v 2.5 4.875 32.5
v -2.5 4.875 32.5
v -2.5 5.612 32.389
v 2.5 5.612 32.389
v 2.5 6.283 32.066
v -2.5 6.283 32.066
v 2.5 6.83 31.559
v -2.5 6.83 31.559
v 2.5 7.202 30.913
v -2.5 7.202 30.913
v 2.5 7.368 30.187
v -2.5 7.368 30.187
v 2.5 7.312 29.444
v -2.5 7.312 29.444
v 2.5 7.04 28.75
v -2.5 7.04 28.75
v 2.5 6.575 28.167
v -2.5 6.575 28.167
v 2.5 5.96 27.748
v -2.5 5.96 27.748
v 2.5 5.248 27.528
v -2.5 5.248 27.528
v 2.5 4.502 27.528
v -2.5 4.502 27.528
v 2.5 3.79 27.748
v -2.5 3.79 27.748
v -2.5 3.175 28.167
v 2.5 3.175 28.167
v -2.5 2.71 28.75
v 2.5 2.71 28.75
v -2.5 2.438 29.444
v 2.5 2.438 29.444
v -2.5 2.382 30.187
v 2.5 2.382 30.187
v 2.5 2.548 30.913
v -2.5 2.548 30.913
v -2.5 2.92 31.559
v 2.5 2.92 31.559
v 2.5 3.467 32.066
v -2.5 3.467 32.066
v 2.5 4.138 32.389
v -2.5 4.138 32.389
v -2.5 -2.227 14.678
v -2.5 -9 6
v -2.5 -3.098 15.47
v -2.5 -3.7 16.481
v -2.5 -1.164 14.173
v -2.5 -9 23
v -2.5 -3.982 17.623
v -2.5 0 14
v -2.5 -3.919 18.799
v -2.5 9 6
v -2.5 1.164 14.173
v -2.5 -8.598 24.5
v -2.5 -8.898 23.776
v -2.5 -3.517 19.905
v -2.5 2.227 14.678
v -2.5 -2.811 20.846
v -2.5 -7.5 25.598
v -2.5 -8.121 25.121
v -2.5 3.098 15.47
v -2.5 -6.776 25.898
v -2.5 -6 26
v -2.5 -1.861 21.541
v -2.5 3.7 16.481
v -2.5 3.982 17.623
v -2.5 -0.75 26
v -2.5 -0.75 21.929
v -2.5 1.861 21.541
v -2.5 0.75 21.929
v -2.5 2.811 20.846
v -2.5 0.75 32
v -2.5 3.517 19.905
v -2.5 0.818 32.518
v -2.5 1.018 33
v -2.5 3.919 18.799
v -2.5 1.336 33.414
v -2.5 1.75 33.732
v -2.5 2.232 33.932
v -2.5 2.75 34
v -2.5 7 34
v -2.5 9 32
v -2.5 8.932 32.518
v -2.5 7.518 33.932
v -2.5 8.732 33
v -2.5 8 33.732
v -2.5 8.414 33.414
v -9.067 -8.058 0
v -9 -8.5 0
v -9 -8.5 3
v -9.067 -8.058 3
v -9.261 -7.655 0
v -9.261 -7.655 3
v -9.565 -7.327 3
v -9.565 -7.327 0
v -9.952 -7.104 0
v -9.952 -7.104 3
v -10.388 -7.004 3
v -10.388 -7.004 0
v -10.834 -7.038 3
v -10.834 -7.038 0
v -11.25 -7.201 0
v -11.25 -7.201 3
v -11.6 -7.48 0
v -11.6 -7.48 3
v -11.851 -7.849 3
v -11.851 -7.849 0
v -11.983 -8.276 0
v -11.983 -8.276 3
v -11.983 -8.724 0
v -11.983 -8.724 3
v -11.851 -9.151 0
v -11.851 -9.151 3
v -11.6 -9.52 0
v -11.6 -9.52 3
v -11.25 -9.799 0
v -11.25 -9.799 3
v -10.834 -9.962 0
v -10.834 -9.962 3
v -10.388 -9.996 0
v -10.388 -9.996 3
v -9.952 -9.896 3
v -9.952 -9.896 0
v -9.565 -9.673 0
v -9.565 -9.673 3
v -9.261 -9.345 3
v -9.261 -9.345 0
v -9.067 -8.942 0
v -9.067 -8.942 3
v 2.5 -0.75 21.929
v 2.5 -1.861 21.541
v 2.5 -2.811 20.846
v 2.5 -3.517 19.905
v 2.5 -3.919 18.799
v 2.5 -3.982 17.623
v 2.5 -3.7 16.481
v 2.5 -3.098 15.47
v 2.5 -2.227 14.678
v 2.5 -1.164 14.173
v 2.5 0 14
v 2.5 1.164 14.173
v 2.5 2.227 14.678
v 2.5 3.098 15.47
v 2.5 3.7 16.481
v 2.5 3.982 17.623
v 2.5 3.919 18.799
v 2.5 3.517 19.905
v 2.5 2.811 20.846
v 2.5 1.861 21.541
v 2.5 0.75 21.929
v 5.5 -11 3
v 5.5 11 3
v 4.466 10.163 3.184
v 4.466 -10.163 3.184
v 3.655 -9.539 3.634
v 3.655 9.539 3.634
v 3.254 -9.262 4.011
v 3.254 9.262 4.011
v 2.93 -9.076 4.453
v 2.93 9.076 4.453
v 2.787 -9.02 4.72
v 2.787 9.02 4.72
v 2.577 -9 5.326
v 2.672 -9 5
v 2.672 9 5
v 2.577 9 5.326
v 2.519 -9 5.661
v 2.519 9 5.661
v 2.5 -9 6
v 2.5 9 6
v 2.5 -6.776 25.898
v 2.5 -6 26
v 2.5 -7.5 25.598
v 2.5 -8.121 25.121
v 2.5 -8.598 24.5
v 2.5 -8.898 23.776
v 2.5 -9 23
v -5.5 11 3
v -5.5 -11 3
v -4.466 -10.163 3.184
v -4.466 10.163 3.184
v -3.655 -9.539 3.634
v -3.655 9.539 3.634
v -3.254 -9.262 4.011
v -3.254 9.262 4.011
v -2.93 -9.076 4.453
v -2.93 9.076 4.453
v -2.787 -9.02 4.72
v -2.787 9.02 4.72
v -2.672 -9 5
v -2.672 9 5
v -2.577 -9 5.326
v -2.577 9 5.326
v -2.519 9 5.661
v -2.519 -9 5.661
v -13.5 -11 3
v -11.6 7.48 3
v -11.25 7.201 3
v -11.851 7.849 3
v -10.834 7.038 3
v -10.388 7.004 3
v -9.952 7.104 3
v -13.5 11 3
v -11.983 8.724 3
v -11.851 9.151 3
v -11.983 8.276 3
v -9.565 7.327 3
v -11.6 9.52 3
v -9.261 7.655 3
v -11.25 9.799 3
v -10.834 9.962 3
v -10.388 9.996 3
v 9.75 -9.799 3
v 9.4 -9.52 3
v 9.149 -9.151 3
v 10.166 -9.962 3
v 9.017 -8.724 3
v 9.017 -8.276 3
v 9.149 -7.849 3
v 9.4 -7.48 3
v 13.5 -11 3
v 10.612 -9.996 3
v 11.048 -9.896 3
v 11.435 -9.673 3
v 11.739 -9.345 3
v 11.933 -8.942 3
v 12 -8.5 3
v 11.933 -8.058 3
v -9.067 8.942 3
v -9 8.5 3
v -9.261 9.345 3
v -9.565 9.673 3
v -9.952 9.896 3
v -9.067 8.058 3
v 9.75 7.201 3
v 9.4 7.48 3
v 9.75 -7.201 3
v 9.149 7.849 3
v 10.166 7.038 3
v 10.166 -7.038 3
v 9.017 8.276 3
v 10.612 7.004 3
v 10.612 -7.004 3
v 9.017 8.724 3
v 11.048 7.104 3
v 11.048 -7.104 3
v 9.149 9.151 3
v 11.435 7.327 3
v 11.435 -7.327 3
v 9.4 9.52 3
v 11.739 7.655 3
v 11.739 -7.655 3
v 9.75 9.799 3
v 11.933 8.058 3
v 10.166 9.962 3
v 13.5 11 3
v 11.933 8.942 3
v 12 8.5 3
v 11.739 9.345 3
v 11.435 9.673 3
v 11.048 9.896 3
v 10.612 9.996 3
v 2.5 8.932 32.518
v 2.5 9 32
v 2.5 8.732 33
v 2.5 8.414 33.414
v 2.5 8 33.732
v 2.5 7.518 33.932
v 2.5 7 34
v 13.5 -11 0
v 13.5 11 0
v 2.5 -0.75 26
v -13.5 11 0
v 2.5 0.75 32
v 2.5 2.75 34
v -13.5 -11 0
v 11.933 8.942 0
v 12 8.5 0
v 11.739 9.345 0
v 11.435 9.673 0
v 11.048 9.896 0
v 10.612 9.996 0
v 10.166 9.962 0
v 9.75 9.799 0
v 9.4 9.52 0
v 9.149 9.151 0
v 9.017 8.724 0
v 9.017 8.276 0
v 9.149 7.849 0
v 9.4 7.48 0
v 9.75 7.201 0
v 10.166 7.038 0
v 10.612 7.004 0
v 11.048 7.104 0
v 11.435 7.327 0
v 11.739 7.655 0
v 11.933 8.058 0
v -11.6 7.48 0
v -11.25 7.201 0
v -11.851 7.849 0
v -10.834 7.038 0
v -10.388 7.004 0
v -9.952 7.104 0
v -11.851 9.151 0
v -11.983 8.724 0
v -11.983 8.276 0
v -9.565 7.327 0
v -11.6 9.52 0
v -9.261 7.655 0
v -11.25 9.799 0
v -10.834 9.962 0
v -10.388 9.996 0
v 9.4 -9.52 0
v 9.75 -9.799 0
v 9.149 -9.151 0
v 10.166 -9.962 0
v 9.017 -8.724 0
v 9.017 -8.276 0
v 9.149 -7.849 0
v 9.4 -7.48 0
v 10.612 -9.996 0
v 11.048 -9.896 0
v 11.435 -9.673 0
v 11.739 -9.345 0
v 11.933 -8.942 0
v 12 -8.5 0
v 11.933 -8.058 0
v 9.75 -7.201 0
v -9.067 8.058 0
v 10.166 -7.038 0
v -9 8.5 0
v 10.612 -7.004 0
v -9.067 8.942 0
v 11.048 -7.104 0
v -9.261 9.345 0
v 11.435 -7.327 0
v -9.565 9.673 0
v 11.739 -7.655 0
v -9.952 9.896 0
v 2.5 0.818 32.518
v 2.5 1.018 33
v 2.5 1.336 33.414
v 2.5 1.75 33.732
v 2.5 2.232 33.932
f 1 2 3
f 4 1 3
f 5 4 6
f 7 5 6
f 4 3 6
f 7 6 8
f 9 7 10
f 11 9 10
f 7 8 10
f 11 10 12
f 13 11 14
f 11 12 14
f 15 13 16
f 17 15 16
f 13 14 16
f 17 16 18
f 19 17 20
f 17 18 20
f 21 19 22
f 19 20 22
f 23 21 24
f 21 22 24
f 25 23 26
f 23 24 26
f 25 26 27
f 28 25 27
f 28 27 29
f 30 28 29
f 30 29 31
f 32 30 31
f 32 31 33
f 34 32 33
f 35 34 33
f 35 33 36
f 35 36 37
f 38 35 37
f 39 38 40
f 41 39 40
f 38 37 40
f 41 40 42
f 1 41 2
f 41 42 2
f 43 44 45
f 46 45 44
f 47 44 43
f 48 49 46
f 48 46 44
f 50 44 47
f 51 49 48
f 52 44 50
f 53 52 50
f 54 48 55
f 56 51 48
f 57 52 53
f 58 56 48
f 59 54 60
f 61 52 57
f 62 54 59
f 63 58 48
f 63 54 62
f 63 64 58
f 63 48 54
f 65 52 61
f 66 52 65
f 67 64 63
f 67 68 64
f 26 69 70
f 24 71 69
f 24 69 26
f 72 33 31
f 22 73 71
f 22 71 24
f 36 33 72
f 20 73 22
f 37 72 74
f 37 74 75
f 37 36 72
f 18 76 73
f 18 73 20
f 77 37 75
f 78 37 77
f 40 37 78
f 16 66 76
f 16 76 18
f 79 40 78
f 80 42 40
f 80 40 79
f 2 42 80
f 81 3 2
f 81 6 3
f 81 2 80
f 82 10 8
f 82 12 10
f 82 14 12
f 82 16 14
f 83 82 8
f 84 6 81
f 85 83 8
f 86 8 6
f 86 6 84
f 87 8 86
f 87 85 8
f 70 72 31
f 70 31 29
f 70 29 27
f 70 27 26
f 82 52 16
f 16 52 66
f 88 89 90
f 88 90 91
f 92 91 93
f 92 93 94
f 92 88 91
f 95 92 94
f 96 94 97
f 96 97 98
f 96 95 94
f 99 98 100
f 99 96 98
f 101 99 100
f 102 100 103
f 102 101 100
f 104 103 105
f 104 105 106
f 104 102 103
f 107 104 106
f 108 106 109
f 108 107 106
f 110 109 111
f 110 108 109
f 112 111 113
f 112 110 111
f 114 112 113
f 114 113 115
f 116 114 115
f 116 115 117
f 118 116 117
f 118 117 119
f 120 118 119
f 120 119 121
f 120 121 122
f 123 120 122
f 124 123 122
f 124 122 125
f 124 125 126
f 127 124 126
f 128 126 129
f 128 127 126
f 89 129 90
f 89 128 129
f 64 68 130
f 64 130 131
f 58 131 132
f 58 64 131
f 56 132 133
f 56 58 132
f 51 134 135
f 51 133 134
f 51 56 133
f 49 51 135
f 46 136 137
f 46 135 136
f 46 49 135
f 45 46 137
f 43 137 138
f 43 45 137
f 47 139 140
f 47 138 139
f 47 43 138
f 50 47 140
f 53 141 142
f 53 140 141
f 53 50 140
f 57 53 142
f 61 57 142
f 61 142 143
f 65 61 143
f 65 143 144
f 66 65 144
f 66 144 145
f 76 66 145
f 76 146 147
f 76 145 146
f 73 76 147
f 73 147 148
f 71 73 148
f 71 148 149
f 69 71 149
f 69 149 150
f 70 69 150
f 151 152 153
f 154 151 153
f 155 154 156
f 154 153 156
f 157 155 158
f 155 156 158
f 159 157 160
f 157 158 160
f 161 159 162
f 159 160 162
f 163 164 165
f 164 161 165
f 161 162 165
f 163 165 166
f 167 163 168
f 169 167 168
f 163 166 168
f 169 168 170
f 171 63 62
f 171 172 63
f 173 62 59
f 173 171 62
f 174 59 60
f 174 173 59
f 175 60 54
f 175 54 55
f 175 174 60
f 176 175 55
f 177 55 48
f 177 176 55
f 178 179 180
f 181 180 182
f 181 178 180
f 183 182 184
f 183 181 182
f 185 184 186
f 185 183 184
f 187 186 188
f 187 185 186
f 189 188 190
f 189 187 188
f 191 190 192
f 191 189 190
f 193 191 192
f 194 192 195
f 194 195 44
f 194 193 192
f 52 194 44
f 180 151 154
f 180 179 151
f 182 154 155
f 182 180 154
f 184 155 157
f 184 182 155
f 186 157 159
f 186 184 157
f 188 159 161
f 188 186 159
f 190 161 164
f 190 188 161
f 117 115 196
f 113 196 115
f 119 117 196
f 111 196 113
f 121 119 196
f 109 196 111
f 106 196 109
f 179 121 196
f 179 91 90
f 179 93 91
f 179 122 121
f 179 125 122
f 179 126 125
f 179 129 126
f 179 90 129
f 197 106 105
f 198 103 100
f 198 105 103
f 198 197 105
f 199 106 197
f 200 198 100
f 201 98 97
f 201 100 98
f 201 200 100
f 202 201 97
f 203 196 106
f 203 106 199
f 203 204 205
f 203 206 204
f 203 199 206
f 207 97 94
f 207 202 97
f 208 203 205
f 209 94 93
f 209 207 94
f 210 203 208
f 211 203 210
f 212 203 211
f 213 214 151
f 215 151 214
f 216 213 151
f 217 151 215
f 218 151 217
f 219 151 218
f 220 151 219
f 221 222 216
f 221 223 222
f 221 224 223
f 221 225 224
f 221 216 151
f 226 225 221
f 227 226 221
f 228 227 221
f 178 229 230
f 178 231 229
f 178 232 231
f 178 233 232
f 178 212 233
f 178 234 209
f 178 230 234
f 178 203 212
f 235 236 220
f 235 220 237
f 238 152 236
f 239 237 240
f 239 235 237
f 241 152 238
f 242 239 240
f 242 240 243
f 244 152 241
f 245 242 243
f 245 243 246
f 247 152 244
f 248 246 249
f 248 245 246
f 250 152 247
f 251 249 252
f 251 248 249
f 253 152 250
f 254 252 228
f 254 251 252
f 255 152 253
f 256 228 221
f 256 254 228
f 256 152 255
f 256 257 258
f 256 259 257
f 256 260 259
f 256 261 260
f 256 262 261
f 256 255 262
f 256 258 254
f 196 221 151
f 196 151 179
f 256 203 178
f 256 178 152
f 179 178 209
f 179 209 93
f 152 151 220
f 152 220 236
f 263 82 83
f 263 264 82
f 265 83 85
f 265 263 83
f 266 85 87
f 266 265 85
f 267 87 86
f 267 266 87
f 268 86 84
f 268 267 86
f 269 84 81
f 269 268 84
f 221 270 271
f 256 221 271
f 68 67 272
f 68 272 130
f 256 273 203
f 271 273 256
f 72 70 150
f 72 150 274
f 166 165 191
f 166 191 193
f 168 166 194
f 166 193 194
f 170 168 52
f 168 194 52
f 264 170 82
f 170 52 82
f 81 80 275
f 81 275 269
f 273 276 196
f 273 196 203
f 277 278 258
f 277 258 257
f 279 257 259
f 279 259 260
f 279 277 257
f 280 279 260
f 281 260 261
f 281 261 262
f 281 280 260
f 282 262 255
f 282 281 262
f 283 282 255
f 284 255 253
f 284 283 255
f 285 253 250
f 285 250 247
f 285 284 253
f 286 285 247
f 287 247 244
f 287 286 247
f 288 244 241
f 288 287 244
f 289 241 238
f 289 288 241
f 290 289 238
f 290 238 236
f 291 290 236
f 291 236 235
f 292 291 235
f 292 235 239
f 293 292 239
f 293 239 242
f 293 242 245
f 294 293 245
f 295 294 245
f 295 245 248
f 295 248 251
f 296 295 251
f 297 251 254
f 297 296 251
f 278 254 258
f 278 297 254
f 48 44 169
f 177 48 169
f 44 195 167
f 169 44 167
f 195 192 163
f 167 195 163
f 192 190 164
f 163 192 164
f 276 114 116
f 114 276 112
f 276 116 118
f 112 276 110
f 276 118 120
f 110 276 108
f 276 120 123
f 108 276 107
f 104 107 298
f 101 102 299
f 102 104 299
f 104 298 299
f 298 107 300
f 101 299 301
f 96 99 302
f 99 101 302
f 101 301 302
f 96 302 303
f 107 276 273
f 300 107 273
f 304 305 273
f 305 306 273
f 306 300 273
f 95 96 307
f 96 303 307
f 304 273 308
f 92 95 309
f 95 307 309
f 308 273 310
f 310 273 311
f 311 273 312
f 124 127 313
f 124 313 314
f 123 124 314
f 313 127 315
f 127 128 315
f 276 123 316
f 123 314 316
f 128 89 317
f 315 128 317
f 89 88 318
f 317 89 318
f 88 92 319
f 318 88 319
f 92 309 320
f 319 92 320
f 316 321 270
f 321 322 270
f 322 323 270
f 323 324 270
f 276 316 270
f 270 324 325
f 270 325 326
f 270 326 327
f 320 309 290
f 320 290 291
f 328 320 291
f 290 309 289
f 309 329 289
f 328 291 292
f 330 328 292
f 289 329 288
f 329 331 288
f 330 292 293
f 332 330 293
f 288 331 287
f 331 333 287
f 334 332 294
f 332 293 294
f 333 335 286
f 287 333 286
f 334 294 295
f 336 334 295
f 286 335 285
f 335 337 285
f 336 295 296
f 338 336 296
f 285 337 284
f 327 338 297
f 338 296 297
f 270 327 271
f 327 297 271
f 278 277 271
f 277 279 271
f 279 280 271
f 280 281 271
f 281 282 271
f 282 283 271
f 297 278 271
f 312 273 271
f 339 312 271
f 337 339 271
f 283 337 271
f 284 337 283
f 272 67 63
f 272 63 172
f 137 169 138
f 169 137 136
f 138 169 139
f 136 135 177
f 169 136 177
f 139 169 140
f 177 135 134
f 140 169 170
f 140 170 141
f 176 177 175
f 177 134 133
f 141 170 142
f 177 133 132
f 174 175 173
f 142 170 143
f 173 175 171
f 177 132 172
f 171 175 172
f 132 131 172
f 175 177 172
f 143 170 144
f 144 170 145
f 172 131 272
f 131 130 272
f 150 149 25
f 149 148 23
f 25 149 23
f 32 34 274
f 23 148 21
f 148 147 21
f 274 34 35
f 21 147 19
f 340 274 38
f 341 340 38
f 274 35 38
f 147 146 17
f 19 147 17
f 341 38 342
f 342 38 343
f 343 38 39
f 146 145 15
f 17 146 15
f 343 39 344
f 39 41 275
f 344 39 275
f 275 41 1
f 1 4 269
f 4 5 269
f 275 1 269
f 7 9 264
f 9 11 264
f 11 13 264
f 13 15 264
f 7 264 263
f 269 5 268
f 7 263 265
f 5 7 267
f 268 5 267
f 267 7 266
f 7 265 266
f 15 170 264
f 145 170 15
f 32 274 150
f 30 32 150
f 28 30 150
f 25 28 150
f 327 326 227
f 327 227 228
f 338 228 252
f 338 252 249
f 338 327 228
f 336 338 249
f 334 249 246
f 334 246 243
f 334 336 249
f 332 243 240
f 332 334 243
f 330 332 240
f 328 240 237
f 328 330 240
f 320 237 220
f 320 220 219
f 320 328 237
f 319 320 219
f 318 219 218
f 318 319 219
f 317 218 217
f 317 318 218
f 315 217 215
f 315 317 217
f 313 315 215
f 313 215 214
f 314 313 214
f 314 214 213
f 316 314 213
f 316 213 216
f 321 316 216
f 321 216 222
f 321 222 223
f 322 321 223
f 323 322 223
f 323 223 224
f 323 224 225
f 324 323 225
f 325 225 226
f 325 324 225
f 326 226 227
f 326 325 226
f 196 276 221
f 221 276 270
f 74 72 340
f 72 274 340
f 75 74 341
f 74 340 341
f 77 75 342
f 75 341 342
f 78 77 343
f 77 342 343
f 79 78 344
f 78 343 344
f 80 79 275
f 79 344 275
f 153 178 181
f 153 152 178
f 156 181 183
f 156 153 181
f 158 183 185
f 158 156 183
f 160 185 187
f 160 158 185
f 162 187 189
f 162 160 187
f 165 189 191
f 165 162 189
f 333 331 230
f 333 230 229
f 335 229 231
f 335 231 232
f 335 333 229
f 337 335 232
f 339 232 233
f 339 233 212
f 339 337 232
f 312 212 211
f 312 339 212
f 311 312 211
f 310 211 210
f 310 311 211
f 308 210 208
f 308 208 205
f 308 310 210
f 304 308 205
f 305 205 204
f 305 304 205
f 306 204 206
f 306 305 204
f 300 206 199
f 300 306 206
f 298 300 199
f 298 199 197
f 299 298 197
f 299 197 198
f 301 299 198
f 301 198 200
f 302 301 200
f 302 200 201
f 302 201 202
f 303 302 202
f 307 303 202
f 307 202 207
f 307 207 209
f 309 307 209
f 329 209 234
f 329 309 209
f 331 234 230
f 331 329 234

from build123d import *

# Parameters (mm, degrees)
SKETCH1_W               = 27
SKETCH1_H               = 22
SKETCH1_R               = 1.5
BOSS_EXTRUDE1_DEPTH     = 3
SKETCH2_W               = 5
SKETCH2_H               = 18
BOSS_EXTRUDE2_DEPTH     = 23
CUT_EXTRUDE1_DEPTH      = 33.449961479
CUT_EXTRUDE1_DEPTH_BACK = 33.449961479
SKETCH3_R               = 4
CUT_EXTRUDE2_DEPTH      = 33.449961479
CUT_EXTRUDE2_DEPTH_BACK = 33.449961479
SKETCH4_W               = 9.515030356
SKETCH4_H               = 1.5
FILLET1_R               = 3
FILLET2_R               = 2
FILLET3_R               = 3
SKETCH6_W               = 8
SKETCH6_H               = 8.25
SKETCH6_R               = 2.5
BOSS_EXTRUDE3_DEPTH     = 5
FILLET4_R               = 2


with BuildPart() as part:
    # Sketch1 → Boss-Extrude1 (new body)
    with BuildSketch(Plane.XY):
        Rectangle(SKETCH1_W, SKETCH1_H)
        with Locations((-10.5, -8.5)):
            Circle(SKETCH1_R, mode=Mode.SUBTRACT)
        with Locations((-10.5, 8.5)):
            Circle(SKETCH1_R, mode=Mode.SUBTRACT)
        with Locations((10.5, 8.5)):
            Circle(SKETCH1_R, mode=Mode.SUBTRACT)
        with Locations((10.5, -8.5)):
            Circle(SKETCH1_R, mode=Mode.SUBTRACT)
    extrude(amount=BOSS_EXTRUDE1_DEPTH)

    # Sketch2 → Boss-Extrude2 (add)
    with BuildSketch(Plane.XY.offset(3)):
        Rectangle(SKETCH2_W, SKETCH2_H)
    extrude(amount=BOSS_EXTRUDE2_DEPTH)

    # Sketch3 → Cut-Extrude1 (cut, two sides: drawn at the far end of the back side and taken through both)
    with BuildSketch(Plane(origin=(2.5, 0, 0), x_dir=(0, 0, -1), z_dir=(1, 0, 0)).offset(-CUT_EXTRUDE1_DEPTH_BACK)):
        with Locations(Location((-18, 0, 0), (0, 0, 180))):
            Circle(SKETCH3_R)
    extrude(amount=CUT_EXTRUDE1_DEPTH + CUT_EXTRUDE1_DEPTH_BACK, mode=Mode.SUBTRACT)

    # Sketch4 → Cut-Extrude2 (cut, two sides: drawn at the far end of the back side and taken through both)
    with BuildSketch(Plane(origin=(2.5, 0, 0), x_dir=(0, 0, -1), z_dir=(1, 0, 0)).offset(-CUT_EXTRUDE2_DEPTH_BACK)):
        with Locations((-21.491106051, 0)):
            Rectangle(SKETCH4_W, SKETCH4_H)
    extrude(amount=CUT_EXTRUDE2_DEPTH + CUT_EXTRUDE2_DEPTH_BACK, mode=Mode.SUBTRACT)

    # Fillet1
    fillet1_edges = [part.edges().sort_by_distance(p)[0] for p in [
        (-2.5, 0, 3),
        (2.5, 0, 3),
    ]]
    fillet(fillet1_edges, radius=FILLET1_R)

    # Fillet2
    fillet2_edges = [part.edges().sort_by_distance(p)[0] for p in [
        (0, -9, 3),
        (0, 9, 3),
    ]]
    fillet(fillet2_edges, radius=FILLET2_R - 0.0001)  # a hair under: the kernel refuses the full size

    # Fillet3
    fillet3_edges = [part.edges().sort_by_distance(p)[0] for p in [
        (0, -9, 26),
    ]]
    fillet(fillet3_edges, radius=FILLET3_R)

    # Sketch6 → Boss-Extrude3 (add)
    with BuildSketch(Plane.ZY.offset(2.5)):
        with Locations((30, 4.875)):
            Rectangle(SKETCH6_W, SKETCH6_H)
        with Locations((30, 4.875)):
            Circle(SKETCH6_R, mode=Mode.SUBTRACT)
    extrude(amount=-BOSS_EXTRUDE3_DEPTH)

    # Fillet4
    fillet4_edges = [part.edges().sort_by_distance(p)[0] for p in [
        (0, 0.75, 34),
        (0, 9, 34),
    ]]
    fillet(fillet4_edges, radius=FILLET4_R)


solid = part.part
